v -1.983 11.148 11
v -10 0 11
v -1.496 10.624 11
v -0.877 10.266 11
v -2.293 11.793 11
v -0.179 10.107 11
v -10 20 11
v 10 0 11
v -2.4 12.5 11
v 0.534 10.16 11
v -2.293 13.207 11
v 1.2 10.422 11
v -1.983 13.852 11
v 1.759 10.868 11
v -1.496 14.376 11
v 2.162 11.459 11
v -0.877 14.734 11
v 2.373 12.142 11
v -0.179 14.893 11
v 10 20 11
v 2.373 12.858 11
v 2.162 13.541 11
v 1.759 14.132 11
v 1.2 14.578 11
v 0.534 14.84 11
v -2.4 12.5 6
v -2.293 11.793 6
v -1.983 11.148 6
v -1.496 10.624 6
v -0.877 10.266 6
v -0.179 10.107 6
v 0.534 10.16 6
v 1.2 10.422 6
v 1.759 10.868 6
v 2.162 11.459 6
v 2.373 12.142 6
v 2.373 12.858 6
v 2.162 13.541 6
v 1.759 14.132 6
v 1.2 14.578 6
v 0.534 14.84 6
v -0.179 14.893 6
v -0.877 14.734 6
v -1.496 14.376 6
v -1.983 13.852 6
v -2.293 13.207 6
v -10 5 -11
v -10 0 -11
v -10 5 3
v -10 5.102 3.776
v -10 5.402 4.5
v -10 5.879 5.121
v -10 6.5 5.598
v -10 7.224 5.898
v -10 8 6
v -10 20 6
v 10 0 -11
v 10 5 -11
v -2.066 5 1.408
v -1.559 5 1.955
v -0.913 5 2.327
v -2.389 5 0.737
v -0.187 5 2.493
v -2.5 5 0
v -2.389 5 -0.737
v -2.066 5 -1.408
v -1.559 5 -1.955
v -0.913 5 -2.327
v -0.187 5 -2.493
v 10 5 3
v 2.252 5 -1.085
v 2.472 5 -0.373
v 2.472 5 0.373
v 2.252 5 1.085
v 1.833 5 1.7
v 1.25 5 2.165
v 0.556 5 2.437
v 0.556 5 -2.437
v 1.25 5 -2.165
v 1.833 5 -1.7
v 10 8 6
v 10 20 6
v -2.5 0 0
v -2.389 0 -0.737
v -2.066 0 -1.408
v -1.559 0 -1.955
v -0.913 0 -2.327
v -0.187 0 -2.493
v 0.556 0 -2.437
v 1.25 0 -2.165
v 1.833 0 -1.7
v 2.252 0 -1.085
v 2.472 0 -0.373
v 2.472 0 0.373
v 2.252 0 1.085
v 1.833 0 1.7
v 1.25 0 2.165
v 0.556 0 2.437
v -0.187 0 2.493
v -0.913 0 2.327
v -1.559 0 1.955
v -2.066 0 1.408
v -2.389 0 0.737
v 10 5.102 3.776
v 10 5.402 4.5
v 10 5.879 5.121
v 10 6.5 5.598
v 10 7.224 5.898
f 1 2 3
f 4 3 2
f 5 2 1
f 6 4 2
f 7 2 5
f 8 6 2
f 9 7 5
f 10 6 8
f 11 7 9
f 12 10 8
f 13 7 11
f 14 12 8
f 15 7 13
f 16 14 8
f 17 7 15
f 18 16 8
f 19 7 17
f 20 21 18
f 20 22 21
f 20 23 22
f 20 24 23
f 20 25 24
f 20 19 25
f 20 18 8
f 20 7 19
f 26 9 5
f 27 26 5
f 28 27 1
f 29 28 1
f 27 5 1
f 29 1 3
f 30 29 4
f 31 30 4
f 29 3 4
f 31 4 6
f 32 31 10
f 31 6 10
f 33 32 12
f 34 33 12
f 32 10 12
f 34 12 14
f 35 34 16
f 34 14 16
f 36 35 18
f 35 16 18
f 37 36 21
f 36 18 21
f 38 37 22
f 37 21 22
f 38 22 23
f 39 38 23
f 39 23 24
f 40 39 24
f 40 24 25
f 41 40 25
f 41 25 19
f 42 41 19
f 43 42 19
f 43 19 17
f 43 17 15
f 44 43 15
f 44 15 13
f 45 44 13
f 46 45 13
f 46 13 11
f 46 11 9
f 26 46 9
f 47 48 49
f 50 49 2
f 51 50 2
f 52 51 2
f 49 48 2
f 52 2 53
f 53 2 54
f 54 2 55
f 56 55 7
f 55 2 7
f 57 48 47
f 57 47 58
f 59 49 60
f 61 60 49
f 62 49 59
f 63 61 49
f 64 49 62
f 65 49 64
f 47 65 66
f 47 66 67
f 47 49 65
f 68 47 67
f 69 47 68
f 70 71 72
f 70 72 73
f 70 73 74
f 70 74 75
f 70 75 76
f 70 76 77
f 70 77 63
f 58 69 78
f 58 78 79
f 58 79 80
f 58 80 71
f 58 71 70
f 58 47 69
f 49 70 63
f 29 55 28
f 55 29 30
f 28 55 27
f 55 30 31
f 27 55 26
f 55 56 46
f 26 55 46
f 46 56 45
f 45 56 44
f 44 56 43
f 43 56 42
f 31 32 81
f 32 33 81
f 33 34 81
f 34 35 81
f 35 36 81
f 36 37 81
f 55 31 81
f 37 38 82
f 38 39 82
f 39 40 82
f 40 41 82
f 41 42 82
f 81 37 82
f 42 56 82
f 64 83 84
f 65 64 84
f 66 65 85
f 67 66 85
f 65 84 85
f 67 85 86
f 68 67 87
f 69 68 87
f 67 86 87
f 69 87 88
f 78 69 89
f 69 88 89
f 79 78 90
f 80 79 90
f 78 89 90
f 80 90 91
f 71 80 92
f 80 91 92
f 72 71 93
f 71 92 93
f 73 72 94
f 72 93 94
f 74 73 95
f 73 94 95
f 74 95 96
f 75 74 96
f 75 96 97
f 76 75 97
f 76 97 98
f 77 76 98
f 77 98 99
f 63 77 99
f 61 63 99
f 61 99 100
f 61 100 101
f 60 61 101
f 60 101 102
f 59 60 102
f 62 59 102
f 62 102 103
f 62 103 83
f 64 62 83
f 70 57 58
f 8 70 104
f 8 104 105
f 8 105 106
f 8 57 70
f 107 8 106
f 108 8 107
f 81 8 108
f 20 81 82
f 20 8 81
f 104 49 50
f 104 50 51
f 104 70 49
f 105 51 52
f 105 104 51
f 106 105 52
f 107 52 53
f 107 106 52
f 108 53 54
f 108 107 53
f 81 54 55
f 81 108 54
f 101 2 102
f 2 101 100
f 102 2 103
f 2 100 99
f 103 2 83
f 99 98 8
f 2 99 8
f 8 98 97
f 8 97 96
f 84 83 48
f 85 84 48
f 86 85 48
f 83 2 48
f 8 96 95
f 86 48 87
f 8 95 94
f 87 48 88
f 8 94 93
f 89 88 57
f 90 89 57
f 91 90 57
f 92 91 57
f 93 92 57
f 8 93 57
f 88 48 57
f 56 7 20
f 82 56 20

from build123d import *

# Parameters (mm, degrees)
SKETCH1_W                    = 20
SKETCH1_H                    = 5
SKETCH1_H_2                  = 12
BOSS_EXTRUDE1_DEPTH          = 5
SKETCH2_W                    = 20
SKETCH2_H                    = 15
BOSS_EXTRUDE2_DEPTH          = 5
F_5_0_5_DIAMETER_HOLE1_D     = 5
F_5_0_5_DIAMETER_HOLE1_DEPTH = 5
F_4_5_M4_HEAT_SET_D          = 4.8
F_4_5_M4_HEAT_SET_DEPTH      = 5
FILLET1_R                    = 3


with BuildPart() as part:
    # Sketch1 → Boss-Extrude1 (new body)
    with BuildSketch(Plane(origin=(0, 0, 0), x_dir=(1, 0, 0), z_dir=(0, 1, 0))):
        with Locations((0, 8.5)):
            Rectangle(SKETCH1_W, SKETCH1_H)
        Rectangle(SKETCH1_W, SKETCH1_H_2)
        with Locations((0, -8.5)):
            Rectangle(SKETCH1_W, SKETCH1_H)
    extrude(amount=BOSS_EXTRUDE1_DEPTH)

    # Sketch2 → Boss-Extrude2 (add)
    with BuildSketch(Plane.XY.offset(11)):
        with Locations((0, 12.5)):
            Rectangle(SKETCH2_W, SKETCH2_H)
    extrude(amount=-BOSS_EXTRUDE2_DEPTH)

    # Ø5.0 (5) Diameter Hole1
    with Locations(Plane(origin=(0, 5, 0), x_dir=(1, 0, 0), z_dir=(0, 1, 0))):
        with Locations((0, 0)):
            Hole(F_5_0_5_DIAMETER_HOLE1_D / 2, depth=F_5_0_5_DIAMETER_HOLE1_DEPTH)

    # Ø4.5 M4 heat set
    with Locations(Plane(origin=(0, 0, 6), x_dir=(1, 0, 0), z_dir=(0, 0, -1))):
        with Locations((0, -12.5)):
            Hole(F_4_5_M4_HEAT_SET_D / 2, depth=F_4_5_M4_HEAT_SET_DEPTH)

    # Fillet1
    fillet1_edges = [part.edges().sort_by_distance(p)[0] for p in [
        (0, 5, 6),
    ]]
    fillet(fillet1_edges, radius=FILLET1_R)


solid = part.part
